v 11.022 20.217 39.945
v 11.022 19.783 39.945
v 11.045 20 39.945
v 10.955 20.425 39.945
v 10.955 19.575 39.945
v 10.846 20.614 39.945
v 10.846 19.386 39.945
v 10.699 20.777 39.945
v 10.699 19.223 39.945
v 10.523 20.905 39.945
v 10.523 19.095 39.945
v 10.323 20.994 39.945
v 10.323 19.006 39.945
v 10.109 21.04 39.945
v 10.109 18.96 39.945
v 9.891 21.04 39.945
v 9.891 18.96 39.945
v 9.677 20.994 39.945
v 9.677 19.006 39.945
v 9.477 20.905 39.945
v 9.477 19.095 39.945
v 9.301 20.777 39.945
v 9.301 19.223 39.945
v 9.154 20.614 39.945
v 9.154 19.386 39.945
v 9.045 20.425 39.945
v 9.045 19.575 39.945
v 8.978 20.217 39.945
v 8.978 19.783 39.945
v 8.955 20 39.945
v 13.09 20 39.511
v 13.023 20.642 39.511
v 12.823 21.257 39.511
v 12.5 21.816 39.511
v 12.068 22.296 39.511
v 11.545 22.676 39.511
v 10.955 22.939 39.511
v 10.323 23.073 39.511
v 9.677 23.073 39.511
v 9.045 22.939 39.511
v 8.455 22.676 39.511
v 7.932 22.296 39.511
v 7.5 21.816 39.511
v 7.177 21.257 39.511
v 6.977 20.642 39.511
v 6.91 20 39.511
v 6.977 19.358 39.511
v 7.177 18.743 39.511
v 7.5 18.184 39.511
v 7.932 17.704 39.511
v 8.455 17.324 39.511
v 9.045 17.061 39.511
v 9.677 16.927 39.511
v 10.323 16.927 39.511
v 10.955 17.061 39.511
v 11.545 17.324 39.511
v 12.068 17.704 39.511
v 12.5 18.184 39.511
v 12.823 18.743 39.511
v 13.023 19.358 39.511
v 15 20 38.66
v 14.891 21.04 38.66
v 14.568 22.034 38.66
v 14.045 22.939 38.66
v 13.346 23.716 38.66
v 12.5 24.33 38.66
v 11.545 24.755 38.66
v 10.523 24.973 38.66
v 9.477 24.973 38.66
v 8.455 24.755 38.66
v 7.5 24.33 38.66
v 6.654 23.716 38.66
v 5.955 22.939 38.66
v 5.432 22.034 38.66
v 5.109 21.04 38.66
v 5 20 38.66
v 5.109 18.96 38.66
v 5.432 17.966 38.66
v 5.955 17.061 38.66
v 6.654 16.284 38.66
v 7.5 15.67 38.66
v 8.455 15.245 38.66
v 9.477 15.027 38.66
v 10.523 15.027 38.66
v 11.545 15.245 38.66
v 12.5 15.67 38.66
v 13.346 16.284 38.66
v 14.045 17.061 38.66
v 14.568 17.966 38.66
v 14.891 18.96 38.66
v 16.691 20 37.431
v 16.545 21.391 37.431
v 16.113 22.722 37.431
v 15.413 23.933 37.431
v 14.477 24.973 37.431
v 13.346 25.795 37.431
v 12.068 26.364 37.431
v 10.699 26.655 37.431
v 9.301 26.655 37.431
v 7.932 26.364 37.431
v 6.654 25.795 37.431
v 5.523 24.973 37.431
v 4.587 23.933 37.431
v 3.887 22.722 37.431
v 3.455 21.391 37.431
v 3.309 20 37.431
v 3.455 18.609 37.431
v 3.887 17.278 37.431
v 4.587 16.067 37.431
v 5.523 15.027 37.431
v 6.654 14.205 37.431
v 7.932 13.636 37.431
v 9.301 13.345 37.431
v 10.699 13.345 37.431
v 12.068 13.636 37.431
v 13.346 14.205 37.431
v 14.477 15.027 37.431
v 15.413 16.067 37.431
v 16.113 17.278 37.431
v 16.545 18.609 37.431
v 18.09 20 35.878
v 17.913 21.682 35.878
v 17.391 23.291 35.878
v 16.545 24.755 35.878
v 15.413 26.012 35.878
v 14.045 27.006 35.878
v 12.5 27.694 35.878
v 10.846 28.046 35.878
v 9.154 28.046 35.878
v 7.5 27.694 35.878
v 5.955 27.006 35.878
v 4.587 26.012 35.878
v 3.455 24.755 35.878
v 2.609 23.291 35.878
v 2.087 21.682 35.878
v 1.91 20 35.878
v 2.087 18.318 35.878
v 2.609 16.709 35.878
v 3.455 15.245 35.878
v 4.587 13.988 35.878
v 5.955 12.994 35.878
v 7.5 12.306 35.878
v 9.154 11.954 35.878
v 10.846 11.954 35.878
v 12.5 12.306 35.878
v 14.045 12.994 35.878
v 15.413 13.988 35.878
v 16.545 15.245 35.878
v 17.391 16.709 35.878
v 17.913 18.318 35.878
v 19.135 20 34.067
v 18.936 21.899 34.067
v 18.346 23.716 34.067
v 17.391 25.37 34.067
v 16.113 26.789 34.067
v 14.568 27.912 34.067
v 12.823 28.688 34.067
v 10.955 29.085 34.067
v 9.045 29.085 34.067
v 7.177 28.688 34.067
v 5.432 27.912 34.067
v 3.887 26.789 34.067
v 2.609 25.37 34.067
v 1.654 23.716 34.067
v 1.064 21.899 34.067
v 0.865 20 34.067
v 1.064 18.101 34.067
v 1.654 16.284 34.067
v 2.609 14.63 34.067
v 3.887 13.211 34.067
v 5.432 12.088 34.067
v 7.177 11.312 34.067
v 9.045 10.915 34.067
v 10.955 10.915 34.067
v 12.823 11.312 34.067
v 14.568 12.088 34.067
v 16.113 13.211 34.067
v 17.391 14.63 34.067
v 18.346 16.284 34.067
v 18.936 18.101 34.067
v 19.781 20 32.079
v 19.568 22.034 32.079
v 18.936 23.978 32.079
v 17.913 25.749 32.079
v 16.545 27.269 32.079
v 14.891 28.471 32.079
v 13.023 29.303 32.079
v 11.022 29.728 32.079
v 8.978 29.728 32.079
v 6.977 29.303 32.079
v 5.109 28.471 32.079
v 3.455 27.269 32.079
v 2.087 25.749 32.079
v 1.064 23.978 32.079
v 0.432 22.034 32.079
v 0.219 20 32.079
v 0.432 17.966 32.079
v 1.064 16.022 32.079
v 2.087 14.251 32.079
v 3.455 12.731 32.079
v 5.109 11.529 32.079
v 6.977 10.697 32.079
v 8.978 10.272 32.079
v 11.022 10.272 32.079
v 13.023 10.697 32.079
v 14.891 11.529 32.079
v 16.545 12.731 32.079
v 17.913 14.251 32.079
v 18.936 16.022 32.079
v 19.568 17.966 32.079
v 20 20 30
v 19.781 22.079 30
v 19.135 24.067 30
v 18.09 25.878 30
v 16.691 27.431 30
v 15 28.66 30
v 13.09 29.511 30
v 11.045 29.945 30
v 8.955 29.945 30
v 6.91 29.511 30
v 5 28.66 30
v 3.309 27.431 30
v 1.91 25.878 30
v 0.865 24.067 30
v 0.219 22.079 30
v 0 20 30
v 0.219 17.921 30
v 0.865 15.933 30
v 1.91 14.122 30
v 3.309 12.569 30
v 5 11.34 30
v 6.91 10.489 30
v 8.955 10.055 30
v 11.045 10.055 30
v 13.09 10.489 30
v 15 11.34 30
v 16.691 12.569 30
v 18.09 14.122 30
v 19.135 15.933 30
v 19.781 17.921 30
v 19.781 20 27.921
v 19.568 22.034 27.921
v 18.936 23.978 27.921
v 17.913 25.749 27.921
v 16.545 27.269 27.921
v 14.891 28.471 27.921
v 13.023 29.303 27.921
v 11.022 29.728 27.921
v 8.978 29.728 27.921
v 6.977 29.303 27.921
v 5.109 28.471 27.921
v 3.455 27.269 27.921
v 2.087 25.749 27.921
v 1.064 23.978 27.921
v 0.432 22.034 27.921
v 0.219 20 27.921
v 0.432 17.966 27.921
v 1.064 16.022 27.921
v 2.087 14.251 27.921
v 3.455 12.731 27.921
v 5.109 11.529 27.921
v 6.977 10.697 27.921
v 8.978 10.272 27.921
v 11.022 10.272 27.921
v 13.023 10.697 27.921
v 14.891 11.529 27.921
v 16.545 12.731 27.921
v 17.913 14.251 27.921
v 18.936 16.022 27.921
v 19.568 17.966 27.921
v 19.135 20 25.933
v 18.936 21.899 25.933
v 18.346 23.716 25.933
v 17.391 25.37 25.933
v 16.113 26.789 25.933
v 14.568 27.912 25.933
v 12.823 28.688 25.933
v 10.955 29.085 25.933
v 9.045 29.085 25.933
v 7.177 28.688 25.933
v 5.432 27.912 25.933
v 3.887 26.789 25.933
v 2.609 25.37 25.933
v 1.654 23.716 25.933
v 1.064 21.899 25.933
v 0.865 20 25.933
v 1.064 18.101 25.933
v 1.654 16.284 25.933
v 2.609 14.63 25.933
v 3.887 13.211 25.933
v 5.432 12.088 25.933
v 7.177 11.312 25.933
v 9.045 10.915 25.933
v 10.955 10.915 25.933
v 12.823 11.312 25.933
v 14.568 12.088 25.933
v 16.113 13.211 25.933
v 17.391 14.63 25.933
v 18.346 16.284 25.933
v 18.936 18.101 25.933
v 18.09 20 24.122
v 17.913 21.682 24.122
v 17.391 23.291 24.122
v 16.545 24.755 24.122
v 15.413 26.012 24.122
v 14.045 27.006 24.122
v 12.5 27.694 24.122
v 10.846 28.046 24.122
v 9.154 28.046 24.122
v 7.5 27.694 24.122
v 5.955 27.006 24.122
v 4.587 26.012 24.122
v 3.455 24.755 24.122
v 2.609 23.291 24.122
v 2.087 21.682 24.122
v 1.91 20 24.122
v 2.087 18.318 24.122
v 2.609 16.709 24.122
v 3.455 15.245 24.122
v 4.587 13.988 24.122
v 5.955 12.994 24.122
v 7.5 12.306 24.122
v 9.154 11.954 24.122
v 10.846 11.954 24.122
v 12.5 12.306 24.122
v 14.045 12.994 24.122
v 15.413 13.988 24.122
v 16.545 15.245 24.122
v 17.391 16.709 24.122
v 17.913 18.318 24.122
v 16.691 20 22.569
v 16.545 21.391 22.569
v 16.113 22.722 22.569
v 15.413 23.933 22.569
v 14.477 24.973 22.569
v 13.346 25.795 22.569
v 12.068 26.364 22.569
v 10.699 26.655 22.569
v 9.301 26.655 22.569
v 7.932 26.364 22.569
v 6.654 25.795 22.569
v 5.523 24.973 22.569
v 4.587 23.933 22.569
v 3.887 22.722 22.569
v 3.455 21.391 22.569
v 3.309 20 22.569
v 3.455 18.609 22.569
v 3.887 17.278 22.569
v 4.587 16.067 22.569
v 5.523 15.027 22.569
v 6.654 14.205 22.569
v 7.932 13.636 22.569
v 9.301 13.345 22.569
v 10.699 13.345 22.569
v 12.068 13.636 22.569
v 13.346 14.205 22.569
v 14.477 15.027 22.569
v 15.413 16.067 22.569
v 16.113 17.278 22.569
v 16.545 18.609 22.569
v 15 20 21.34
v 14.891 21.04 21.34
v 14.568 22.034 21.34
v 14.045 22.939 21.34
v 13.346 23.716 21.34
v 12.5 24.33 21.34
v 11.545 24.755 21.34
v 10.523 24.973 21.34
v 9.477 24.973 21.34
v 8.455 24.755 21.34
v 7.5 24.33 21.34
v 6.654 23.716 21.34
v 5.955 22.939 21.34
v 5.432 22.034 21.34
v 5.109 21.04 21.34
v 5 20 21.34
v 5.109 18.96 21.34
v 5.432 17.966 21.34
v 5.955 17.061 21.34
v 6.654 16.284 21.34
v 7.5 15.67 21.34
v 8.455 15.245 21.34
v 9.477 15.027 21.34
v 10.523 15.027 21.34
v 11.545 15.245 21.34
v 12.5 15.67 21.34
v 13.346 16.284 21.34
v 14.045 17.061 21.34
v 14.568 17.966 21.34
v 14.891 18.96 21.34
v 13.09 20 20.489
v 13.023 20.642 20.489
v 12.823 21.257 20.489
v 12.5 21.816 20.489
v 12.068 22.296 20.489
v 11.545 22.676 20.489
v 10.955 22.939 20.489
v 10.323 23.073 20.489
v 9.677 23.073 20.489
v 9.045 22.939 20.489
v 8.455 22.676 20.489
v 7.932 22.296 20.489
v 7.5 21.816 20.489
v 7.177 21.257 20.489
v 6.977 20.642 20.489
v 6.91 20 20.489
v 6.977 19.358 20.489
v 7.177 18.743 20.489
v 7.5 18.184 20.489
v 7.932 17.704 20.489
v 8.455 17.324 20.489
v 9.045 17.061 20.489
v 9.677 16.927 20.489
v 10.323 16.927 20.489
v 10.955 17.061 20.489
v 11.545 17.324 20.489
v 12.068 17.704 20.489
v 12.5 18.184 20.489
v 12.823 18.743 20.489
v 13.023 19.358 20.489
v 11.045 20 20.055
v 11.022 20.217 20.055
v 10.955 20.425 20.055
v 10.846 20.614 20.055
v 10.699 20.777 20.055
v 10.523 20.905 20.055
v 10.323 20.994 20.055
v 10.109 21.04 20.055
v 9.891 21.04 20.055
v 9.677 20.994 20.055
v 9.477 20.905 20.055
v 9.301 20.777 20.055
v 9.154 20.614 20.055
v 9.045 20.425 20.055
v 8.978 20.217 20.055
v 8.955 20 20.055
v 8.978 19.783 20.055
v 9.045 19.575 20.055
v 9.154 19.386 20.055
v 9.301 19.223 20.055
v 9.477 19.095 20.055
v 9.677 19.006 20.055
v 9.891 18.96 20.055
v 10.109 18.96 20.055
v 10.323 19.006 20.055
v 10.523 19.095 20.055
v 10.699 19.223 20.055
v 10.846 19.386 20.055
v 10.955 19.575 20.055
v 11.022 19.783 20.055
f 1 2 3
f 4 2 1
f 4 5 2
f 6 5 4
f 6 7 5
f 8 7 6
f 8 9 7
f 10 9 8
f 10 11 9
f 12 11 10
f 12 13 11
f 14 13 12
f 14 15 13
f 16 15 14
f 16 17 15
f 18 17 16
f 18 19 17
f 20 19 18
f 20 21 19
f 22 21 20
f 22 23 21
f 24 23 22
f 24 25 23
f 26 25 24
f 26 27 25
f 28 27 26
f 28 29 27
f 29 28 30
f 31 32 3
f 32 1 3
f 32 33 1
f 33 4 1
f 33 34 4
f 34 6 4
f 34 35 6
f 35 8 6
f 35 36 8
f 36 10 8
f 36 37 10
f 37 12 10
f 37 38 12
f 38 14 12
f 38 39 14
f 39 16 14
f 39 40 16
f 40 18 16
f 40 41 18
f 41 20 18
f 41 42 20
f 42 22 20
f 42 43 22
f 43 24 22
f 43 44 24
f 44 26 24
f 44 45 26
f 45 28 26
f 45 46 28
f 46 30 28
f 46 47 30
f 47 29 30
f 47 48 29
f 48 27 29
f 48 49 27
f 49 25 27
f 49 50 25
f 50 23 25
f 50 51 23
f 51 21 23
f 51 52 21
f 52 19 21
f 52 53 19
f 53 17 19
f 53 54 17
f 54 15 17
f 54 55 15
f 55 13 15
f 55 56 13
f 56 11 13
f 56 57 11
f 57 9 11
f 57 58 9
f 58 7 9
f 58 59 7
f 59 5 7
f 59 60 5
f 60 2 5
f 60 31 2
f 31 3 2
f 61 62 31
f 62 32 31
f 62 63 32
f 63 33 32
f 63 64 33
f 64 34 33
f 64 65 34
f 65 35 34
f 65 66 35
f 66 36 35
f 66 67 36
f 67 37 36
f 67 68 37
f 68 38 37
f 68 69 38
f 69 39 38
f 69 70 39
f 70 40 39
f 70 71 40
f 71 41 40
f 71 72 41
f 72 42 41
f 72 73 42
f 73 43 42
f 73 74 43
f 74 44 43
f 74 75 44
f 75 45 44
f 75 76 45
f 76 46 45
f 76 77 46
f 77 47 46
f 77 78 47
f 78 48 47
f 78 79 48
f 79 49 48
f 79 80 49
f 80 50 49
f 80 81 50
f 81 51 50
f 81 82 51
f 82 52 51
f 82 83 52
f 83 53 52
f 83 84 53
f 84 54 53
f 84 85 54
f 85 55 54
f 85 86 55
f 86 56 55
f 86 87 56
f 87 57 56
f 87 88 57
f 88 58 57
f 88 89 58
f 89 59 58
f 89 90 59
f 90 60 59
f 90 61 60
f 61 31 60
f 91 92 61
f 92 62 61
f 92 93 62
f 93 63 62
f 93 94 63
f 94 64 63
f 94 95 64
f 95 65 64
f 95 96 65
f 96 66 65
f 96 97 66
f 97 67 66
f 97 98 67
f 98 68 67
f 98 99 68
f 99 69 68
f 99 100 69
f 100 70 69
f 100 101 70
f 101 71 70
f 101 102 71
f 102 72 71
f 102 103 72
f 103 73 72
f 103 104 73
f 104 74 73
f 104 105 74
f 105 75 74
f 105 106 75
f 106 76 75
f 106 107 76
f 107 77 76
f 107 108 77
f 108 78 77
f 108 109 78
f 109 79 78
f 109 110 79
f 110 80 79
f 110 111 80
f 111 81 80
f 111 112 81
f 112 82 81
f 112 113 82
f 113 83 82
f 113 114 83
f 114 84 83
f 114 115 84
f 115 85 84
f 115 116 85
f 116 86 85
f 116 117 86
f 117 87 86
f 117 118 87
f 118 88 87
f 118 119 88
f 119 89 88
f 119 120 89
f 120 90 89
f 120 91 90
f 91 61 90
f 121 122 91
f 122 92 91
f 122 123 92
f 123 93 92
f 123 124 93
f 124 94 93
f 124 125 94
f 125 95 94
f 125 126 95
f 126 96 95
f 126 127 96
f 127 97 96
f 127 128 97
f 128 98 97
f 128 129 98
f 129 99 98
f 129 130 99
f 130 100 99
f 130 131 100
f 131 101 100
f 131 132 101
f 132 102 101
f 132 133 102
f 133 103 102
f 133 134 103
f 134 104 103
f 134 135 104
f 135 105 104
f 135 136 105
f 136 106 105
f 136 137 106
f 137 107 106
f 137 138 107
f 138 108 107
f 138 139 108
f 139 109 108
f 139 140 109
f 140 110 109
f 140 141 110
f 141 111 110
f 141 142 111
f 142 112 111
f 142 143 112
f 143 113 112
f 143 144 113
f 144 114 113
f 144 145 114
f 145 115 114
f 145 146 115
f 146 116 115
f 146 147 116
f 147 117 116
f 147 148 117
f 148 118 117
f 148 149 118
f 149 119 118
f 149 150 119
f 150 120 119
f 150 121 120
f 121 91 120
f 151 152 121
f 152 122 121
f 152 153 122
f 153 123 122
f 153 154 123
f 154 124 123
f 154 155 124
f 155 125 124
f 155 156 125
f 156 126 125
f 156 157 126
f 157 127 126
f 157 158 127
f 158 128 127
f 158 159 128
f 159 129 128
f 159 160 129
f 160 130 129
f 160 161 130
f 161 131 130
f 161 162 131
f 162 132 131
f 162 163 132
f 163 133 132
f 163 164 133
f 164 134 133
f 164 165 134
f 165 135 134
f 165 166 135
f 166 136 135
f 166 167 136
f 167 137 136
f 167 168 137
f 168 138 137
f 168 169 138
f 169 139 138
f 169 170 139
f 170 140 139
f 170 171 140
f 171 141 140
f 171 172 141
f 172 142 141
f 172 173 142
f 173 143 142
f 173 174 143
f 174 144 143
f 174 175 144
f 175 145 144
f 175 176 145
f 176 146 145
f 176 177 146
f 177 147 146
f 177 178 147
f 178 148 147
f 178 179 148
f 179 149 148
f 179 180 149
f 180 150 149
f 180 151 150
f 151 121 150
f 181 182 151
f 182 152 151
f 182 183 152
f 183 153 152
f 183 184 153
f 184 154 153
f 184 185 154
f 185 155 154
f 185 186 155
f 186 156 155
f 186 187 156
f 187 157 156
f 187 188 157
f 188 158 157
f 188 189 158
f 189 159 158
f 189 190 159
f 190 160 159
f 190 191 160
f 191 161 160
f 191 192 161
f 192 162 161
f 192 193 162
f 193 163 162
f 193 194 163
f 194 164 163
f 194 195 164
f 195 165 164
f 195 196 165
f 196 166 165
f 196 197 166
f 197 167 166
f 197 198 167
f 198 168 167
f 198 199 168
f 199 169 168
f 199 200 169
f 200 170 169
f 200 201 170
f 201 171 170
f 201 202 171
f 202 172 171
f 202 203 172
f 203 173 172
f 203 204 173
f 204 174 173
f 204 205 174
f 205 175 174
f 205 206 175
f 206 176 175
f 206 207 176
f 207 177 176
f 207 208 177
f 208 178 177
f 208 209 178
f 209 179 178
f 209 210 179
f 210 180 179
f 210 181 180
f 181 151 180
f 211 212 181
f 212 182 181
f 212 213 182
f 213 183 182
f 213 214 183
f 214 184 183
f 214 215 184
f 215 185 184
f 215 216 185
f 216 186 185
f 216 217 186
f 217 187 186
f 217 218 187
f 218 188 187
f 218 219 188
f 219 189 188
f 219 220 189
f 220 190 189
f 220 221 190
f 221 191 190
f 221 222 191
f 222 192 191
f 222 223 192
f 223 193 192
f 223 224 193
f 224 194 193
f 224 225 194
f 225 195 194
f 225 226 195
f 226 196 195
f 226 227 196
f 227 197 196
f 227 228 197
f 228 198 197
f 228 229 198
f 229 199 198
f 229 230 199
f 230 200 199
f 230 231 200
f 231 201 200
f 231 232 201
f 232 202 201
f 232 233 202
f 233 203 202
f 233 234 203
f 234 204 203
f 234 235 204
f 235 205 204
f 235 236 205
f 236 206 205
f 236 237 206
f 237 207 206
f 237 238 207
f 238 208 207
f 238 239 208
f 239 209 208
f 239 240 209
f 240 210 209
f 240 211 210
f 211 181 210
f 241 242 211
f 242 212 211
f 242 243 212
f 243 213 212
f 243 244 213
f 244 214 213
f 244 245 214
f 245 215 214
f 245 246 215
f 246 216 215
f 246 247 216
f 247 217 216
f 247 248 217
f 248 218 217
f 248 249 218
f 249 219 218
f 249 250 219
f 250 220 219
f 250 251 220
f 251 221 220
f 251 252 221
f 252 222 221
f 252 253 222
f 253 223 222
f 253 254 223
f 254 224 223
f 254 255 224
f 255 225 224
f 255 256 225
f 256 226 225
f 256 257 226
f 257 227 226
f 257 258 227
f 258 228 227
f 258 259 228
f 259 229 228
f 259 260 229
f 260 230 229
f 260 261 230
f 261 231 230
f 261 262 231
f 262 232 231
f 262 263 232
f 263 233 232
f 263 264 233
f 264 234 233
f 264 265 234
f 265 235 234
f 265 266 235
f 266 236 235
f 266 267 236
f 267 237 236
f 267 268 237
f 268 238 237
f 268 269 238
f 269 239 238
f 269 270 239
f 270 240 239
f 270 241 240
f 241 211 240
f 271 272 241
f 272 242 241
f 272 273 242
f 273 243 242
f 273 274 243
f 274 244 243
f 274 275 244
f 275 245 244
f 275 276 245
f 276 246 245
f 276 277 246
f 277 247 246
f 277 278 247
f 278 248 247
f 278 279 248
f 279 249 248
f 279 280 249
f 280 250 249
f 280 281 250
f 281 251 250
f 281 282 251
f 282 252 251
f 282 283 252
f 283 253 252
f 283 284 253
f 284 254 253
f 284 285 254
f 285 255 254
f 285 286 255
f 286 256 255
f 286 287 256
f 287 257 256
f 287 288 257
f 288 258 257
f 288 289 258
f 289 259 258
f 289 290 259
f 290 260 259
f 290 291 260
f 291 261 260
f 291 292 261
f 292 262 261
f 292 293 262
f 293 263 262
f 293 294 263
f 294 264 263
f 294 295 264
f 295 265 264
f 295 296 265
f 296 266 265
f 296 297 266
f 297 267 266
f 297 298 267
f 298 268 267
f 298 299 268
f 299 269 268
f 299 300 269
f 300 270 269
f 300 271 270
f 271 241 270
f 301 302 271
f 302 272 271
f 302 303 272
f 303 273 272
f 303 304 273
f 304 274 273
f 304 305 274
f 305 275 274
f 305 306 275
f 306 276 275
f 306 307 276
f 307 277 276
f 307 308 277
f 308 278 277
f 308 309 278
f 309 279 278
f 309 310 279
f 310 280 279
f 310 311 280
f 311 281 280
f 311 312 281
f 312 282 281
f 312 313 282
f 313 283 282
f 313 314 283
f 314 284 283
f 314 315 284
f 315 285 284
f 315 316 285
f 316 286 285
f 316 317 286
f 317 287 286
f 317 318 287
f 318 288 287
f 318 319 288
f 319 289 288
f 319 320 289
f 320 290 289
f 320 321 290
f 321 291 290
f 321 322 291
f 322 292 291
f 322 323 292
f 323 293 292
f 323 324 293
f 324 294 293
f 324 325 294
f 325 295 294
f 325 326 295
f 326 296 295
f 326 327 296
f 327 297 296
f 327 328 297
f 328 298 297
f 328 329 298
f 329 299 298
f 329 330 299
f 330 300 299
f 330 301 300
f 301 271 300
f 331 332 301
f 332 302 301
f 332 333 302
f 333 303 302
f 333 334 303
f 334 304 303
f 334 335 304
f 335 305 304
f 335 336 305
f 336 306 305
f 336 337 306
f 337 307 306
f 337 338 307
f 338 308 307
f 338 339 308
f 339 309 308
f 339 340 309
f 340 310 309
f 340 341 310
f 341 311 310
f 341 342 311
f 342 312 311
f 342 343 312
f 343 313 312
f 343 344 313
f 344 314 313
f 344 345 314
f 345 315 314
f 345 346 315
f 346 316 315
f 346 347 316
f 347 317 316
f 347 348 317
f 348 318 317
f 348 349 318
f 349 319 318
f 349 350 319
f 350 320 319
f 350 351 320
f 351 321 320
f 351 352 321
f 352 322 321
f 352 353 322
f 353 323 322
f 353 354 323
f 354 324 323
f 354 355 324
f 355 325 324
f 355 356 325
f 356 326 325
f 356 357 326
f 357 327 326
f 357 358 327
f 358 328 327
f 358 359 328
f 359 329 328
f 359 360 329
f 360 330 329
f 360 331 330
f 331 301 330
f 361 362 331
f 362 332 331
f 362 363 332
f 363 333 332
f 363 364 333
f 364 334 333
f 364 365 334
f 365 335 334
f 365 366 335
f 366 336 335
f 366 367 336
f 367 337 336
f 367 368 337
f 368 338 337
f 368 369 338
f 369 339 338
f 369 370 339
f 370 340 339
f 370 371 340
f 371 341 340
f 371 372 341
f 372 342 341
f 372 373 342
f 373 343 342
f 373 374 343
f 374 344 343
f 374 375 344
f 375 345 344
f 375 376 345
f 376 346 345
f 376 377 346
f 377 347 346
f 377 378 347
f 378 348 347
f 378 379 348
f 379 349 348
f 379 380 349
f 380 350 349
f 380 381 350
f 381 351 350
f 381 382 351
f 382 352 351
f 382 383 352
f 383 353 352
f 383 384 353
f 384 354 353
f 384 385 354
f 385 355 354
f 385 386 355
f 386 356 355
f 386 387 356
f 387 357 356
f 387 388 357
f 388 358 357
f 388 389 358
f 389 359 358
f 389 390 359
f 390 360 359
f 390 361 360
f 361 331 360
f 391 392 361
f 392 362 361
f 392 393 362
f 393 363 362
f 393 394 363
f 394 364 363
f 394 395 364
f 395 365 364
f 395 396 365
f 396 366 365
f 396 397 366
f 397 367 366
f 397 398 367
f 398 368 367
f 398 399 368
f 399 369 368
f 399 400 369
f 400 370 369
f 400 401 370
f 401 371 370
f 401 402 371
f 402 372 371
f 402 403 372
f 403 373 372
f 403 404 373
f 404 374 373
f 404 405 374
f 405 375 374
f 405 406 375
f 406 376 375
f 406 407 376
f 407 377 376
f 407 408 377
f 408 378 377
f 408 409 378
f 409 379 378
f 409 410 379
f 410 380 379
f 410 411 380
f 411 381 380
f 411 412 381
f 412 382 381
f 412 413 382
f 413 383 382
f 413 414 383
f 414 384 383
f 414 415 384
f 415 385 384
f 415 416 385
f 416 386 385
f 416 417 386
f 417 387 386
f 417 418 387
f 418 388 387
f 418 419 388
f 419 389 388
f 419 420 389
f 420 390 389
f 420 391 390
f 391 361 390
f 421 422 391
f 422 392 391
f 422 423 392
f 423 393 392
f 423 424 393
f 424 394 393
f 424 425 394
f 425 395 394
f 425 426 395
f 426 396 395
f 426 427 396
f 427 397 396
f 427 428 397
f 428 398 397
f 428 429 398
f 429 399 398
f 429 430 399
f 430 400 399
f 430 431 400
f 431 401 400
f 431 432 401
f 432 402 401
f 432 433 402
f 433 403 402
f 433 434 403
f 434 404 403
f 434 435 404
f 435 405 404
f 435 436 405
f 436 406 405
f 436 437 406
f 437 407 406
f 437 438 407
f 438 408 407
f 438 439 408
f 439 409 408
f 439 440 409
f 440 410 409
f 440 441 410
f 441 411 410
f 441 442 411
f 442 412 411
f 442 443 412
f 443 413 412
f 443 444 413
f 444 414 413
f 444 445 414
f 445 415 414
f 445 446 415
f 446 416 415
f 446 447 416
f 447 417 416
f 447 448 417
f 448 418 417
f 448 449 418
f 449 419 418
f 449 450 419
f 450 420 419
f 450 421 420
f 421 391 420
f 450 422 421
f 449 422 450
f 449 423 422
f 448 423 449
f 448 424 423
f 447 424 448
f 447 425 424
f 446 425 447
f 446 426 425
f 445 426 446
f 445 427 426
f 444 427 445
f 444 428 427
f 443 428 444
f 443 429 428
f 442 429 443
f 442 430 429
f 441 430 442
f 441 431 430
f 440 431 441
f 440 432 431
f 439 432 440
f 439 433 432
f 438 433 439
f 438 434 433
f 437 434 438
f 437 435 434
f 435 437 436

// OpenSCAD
// Unit of length: Unit.MM
translate(v = [10.0, 20.0, 30.0])
{
   sphere(d = 20.0);
}
